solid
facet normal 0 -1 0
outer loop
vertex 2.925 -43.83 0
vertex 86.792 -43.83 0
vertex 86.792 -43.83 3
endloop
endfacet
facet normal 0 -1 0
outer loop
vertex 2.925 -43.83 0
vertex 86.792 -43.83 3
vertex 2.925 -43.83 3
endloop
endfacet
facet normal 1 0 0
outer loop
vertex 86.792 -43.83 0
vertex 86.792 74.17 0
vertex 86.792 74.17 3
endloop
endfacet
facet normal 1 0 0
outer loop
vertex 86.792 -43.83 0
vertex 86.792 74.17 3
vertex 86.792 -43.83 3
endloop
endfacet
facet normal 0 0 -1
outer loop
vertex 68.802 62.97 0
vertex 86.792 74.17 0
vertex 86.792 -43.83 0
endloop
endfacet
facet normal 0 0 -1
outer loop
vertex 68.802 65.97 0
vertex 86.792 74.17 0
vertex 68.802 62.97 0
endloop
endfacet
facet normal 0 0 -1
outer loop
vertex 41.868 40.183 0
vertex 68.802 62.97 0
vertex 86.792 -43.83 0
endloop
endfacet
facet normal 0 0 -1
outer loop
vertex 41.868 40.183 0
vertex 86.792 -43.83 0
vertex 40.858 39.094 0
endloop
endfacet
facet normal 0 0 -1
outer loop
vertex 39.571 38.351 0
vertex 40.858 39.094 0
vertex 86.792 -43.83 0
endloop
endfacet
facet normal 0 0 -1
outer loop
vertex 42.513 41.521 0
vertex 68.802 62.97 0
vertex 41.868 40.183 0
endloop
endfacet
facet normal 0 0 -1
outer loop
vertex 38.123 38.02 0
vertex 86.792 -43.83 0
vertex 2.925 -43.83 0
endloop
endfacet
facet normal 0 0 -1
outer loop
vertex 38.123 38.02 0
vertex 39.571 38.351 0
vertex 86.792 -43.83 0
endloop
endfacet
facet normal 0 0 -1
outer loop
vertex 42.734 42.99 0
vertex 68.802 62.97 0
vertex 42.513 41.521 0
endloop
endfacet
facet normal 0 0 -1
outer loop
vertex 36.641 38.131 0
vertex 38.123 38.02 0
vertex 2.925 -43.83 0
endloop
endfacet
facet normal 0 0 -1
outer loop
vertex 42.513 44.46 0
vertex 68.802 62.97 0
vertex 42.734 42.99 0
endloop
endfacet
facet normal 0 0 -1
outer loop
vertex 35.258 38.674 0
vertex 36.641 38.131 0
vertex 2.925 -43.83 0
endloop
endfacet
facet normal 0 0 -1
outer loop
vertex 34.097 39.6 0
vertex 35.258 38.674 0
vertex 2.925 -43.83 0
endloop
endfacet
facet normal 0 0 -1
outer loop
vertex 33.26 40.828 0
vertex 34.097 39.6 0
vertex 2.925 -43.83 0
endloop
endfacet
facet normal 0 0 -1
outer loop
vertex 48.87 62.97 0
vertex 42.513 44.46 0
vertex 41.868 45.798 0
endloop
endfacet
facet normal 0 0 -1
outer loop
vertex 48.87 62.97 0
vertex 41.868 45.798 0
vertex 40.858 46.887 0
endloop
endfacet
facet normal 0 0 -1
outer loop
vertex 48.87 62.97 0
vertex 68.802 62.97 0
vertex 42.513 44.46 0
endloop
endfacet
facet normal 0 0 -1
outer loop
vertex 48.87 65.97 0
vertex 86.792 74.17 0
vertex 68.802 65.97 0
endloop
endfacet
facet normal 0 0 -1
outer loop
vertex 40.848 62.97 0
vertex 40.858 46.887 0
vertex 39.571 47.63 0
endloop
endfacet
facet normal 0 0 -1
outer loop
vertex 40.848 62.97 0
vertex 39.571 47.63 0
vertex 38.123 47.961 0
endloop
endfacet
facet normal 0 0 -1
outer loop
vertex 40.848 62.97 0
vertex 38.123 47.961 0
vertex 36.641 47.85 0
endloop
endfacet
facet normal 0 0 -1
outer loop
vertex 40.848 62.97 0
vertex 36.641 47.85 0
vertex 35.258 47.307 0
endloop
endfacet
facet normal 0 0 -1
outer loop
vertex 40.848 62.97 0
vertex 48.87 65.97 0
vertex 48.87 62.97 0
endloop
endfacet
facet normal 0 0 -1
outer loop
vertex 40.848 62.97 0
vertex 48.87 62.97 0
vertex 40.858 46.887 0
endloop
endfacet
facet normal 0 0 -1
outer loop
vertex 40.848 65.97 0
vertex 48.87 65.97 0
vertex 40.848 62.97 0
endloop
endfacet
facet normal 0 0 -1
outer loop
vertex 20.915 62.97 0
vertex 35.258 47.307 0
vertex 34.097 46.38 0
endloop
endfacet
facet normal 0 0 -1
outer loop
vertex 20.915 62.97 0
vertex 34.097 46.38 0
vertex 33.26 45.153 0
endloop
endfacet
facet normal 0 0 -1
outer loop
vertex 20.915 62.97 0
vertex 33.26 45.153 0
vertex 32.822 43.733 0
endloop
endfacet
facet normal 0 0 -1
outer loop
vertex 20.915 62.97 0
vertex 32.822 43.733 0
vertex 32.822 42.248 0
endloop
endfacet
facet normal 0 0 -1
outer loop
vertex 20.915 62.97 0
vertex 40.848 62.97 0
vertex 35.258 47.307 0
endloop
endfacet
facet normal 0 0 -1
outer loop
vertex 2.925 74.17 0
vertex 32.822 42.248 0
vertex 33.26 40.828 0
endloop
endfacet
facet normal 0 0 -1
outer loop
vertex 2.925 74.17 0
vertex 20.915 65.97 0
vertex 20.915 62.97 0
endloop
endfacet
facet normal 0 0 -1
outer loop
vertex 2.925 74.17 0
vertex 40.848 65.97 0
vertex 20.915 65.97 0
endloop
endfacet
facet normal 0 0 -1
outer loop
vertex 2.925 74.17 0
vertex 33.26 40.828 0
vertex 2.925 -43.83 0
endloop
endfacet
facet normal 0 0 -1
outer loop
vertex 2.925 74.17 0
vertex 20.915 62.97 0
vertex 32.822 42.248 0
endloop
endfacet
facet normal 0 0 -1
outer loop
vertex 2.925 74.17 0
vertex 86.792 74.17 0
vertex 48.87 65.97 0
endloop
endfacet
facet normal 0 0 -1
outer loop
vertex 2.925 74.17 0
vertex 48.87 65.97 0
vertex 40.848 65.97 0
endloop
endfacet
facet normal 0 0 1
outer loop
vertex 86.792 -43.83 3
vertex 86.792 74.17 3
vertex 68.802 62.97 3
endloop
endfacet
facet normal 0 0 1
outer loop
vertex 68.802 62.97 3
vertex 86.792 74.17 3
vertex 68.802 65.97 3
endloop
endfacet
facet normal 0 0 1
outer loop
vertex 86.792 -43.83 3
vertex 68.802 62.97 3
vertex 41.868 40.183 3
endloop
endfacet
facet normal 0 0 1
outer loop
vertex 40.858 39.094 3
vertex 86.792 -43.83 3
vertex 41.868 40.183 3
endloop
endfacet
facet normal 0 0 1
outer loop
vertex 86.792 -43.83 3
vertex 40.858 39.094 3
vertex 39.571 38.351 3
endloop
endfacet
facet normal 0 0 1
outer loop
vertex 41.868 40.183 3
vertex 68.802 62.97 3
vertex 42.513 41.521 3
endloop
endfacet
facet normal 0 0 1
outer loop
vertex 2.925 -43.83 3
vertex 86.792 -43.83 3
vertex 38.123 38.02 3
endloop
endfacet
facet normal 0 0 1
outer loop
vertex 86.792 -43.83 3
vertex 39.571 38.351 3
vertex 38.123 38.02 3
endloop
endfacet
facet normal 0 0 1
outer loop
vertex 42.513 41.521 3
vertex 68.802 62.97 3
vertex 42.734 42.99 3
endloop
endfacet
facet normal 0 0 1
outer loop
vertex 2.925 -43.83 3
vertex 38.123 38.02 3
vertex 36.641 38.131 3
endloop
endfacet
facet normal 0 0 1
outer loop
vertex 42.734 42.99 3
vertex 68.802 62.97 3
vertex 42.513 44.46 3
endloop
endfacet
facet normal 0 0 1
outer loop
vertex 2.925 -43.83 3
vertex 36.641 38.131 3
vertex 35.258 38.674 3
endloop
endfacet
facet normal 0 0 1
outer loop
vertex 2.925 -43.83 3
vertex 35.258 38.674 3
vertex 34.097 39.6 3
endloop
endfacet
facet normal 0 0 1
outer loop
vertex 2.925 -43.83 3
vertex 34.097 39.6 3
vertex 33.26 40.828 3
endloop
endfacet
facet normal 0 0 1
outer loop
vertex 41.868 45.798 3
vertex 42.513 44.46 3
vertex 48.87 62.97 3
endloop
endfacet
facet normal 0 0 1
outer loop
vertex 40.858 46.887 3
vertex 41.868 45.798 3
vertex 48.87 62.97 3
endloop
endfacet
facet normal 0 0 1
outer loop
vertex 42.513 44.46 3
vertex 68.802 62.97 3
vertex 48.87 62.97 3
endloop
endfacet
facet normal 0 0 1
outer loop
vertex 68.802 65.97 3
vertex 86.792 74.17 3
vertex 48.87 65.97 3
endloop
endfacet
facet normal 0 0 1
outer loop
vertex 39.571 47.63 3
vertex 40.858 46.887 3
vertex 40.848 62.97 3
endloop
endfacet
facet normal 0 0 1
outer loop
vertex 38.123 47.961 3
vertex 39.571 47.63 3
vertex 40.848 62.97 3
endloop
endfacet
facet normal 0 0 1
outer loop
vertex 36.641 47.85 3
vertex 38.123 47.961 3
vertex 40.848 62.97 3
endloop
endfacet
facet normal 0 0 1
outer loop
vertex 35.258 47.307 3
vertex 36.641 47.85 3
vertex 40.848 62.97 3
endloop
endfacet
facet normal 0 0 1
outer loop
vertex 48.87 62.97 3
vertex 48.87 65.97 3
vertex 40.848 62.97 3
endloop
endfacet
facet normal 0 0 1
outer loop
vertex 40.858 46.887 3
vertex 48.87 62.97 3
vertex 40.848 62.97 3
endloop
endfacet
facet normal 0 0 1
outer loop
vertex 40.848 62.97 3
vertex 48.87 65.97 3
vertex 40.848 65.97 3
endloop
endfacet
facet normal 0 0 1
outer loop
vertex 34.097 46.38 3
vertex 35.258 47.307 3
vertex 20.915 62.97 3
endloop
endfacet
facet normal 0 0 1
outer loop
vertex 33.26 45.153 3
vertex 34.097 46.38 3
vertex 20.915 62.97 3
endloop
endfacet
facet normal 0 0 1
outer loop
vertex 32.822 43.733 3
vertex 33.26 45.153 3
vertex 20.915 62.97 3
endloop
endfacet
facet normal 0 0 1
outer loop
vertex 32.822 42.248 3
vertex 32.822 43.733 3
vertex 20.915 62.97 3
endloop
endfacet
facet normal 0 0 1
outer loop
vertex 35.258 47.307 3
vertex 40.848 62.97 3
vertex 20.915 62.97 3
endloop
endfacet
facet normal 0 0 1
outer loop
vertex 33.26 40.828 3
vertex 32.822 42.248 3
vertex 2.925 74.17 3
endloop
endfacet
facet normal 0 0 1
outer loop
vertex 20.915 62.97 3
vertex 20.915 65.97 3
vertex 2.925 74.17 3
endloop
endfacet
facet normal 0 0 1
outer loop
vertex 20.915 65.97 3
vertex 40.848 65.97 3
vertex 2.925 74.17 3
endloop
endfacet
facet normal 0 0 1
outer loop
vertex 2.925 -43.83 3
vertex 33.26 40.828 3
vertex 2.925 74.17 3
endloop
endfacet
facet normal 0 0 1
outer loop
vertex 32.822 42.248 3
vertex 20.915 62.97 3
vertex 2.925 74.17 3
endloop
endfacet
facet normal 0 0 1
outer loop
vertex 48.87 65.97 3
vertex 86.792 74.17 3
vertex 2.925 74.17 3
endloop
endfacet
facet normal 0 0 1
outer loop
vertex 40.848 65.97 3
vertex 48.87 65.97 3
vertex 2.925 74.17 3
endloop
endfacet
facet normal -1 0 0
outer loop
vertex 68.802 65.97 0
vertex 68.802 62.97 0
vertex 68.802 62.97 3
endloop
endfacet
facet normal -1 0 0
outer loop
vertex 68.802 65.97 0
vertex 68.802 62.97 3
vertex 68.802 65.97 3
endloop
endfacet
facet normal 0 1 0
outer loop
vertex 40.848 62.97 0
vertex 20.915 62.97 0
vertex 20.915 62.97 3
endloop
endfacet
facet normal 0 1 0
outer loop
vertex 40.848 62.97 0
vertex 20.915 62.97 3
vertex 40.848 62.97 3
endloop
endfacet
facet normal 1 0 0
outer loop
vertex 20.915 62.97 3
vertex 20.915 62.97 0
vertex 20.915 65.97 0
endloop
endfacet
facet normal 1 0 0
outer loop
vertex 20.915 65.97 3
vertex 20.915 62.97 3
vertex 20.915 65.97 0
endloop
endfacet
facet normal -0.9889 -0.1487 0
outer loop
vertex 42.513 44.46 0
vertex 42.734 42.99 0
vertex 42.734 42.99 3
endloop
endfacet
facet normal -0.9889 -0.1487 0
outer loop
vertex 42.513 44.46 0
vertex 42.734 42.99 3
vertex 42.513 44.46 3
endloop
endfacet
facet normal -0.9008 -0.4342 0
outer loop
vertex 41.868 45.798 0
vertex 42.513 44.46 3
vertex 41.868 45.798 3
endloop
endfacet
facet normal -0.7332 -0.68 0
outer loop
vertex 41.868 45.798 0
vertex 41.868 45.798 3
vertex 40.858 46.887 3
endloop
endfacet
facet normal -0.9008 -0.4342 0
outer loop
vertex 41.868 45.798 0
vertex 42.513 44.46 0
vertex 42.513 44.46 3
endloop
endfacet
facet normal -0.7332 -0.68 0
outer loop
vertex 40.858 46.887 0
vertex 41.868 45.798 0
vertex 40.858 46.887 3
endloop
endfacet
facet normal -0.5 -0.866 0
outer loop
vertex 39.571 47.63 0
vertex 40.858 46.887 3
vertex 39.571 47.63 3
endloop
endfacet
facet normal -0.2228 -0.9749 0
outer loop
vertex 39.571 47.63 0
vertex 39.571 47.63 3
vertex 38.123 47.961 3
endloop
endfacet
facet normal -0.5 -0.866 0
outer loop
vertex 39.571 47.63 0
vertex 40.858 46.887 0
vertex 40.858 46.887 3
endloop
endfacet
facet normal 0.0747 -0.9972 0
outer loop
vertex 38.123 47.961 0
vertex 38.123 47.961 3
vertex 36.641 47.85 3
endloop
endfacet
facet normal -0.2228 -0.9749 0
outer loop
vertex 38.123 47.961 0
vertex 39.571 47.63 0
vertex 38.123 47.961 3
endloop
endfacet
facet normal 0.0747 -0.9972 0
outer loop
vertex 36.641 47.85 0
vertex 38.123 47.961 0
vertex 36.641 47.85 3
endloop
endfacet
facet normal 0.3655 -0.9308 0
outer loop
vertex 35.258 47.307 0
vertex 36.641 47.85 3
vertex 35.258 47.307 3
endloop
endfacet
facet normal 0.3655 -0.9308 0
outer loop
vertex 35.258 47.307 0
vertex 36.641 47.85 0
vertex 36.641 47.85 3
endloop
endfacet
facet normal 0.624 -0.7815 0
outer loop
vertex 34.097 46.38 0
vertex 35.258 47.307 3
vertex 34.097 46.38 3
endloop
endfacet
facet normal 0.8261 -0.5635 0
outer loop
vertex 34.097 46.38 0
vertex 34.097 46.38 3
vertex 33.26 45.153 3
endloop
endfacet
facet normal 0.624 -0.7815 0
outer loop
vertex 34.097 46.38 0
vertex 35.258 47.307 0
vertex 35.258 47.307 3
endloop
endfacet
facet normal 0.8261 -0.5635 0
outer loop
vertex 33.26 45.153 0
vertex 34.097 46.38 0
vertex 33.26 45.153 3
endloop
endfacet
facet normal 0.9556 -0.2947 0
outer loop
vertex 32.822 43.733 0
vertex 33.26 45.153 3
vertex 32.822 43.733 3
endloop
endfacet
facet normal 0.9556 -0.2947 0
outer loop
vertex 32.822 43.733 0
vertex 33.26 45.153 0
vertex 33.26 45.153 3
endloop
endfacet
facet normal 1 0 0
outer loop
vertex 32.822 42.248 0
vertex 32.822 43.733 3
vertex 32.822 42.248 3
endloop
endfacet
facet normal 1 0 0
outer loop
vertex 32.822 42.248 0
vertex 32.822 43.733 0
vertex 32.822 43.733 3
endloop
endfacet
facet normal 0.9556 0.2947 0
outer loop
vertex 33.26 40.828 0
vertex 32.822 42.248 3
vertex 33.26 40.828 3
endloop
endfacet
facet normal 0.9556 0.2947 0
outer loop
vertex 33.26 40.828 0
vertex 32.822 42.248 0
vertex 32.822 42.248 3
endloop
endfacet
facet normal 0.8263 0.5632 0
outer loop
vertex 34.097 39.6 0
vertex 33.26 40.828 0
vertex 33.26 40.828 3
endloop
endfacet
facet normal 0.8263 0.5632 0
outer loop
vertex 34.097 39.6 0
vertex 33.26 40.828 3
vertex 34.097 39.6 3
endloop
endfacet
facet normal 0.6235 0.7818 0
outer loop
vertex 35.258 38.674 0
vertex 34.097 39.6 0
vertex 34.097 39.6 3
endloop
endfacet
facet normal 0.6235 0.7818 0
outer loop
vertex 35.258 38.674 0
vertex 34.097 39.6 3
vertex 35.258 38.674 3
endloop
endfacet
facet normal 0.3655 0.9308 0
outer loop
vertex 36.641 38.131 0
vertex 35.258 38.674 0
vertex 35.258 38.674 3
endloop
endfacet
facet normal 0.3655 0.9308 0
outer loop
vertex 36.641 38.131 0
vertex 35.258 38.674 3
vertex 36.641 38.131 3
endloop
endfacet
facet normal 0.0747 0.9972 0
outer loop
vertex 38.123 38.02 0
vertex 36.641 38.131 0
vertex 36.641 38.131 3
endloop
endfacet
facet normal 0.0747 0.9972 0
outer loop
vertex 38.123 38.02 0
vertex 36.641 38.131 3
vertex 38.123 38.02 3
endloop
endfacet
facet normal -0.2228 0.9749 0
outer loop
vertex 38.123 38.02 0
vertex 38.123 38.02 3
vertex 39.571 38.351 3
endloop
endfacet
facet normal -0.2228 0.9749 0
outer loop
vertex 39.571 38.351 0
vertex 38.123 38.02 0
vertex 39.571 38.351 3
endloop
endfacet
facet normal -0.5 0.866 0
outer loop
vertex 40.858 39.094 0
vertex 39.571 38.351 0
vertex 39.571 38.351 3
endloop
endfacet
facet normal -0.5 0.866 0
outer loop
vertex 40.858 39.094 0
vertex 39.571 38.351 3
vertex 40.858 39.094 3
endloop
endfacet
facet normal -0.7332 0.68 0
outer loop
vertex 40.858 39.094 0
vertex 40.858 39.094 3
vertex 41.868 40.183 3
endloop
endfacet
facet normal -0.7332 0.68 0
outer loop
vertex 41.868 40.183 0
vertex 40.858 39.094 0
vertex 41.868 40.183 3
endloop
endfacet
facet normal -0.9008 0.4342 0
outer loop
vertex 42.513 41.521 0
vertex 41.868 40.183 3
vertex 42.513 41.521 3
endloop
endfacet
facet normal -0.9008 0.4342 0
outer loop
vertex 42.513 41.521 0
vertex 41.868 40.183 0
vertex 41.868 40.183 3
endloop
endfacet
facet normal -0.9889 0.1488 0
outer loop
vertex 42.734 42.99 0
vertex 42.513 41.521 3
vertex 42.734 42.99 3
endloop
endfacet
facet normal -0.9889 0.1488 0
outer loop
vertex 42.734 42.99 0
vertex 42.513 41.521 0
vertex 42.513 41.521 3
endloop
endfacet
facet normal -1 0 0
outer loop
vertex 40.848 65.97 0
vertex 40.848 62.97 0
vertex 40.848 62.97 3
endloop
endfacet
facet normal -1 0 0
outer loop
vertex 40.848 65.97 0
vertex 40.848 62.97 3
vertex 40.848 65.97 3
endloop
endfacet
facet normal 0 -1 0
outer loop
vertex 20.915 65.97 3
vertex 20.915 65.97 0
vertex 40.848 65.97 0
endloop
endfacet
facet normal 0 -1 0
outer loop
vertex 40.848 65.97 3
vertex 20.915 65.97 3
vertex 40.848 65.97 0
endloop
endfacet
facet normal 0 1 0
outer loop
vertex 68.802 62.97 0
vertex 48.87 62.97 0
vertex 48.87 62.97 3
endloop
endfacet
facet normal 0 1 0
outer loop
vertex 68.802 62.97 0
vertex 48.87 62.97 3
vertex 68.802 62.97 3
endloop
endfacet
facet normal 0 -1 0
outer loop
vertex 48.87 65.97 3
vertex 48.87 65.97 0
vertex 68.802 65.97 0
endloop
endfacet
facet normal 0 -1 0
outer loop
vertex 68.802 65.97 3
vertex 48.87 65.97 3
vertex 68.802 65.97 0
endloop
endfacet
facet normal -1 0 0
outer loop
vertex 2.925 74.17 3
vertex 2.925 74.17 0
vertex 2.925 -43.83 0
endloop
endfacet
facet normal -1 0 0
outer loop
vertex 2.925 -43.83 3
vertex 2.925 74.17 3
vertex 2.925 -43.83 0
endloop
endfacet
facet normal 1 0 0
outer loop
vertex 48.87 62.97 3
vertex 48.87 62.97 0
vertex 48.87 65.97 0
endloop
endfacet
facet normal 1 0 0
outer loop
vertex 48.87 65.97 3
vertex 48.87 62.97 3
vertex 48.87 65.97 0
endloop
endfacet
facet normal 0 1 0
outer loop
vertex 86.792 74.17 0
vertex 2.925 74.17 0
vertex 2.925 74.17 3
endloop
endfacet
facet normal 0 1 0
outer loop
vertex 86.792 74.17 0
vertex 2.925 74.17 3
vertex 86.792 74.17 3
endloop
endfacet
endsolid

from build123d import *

# Parameters (mm, degrees)
MODEL_R                 = 4.984012051
MODEL_W                 = 19.932346667
MODEL_H                 = 3
SALIENTE_EXTRUIR1_DEPTH = 3


with BuildPart() as part:
    # Model → Saliente-Extruir1 (new body)
    with BuildSketch(Plane.XY):
        Polygon((86.791955129, -43.830425543), (2.925288462, -43.830425543), (2.925288462, 34.469098382), (2.925288462, 74.169574457), (86.791955129, 74.169574457), align=None)
        with Locations((37.750400228, 42.990457696)):
            Circle(MODEL_R, mode=Mode.SUBTRACT)
        with Locations((58.835741796, 64.469574457)):
            Rectangle(MODEL_W, MODEL_H, mode=Mode.SUBTRACT)
        with Locations((30.881501796, 64.469574457)):
            Rectangle(MODEL_W, MODEL_H, mode=Mode.SUBTRACT)
    extrude(amount=SALIENTE_EXTRUIR1_DEPTH)


solid = part.part
